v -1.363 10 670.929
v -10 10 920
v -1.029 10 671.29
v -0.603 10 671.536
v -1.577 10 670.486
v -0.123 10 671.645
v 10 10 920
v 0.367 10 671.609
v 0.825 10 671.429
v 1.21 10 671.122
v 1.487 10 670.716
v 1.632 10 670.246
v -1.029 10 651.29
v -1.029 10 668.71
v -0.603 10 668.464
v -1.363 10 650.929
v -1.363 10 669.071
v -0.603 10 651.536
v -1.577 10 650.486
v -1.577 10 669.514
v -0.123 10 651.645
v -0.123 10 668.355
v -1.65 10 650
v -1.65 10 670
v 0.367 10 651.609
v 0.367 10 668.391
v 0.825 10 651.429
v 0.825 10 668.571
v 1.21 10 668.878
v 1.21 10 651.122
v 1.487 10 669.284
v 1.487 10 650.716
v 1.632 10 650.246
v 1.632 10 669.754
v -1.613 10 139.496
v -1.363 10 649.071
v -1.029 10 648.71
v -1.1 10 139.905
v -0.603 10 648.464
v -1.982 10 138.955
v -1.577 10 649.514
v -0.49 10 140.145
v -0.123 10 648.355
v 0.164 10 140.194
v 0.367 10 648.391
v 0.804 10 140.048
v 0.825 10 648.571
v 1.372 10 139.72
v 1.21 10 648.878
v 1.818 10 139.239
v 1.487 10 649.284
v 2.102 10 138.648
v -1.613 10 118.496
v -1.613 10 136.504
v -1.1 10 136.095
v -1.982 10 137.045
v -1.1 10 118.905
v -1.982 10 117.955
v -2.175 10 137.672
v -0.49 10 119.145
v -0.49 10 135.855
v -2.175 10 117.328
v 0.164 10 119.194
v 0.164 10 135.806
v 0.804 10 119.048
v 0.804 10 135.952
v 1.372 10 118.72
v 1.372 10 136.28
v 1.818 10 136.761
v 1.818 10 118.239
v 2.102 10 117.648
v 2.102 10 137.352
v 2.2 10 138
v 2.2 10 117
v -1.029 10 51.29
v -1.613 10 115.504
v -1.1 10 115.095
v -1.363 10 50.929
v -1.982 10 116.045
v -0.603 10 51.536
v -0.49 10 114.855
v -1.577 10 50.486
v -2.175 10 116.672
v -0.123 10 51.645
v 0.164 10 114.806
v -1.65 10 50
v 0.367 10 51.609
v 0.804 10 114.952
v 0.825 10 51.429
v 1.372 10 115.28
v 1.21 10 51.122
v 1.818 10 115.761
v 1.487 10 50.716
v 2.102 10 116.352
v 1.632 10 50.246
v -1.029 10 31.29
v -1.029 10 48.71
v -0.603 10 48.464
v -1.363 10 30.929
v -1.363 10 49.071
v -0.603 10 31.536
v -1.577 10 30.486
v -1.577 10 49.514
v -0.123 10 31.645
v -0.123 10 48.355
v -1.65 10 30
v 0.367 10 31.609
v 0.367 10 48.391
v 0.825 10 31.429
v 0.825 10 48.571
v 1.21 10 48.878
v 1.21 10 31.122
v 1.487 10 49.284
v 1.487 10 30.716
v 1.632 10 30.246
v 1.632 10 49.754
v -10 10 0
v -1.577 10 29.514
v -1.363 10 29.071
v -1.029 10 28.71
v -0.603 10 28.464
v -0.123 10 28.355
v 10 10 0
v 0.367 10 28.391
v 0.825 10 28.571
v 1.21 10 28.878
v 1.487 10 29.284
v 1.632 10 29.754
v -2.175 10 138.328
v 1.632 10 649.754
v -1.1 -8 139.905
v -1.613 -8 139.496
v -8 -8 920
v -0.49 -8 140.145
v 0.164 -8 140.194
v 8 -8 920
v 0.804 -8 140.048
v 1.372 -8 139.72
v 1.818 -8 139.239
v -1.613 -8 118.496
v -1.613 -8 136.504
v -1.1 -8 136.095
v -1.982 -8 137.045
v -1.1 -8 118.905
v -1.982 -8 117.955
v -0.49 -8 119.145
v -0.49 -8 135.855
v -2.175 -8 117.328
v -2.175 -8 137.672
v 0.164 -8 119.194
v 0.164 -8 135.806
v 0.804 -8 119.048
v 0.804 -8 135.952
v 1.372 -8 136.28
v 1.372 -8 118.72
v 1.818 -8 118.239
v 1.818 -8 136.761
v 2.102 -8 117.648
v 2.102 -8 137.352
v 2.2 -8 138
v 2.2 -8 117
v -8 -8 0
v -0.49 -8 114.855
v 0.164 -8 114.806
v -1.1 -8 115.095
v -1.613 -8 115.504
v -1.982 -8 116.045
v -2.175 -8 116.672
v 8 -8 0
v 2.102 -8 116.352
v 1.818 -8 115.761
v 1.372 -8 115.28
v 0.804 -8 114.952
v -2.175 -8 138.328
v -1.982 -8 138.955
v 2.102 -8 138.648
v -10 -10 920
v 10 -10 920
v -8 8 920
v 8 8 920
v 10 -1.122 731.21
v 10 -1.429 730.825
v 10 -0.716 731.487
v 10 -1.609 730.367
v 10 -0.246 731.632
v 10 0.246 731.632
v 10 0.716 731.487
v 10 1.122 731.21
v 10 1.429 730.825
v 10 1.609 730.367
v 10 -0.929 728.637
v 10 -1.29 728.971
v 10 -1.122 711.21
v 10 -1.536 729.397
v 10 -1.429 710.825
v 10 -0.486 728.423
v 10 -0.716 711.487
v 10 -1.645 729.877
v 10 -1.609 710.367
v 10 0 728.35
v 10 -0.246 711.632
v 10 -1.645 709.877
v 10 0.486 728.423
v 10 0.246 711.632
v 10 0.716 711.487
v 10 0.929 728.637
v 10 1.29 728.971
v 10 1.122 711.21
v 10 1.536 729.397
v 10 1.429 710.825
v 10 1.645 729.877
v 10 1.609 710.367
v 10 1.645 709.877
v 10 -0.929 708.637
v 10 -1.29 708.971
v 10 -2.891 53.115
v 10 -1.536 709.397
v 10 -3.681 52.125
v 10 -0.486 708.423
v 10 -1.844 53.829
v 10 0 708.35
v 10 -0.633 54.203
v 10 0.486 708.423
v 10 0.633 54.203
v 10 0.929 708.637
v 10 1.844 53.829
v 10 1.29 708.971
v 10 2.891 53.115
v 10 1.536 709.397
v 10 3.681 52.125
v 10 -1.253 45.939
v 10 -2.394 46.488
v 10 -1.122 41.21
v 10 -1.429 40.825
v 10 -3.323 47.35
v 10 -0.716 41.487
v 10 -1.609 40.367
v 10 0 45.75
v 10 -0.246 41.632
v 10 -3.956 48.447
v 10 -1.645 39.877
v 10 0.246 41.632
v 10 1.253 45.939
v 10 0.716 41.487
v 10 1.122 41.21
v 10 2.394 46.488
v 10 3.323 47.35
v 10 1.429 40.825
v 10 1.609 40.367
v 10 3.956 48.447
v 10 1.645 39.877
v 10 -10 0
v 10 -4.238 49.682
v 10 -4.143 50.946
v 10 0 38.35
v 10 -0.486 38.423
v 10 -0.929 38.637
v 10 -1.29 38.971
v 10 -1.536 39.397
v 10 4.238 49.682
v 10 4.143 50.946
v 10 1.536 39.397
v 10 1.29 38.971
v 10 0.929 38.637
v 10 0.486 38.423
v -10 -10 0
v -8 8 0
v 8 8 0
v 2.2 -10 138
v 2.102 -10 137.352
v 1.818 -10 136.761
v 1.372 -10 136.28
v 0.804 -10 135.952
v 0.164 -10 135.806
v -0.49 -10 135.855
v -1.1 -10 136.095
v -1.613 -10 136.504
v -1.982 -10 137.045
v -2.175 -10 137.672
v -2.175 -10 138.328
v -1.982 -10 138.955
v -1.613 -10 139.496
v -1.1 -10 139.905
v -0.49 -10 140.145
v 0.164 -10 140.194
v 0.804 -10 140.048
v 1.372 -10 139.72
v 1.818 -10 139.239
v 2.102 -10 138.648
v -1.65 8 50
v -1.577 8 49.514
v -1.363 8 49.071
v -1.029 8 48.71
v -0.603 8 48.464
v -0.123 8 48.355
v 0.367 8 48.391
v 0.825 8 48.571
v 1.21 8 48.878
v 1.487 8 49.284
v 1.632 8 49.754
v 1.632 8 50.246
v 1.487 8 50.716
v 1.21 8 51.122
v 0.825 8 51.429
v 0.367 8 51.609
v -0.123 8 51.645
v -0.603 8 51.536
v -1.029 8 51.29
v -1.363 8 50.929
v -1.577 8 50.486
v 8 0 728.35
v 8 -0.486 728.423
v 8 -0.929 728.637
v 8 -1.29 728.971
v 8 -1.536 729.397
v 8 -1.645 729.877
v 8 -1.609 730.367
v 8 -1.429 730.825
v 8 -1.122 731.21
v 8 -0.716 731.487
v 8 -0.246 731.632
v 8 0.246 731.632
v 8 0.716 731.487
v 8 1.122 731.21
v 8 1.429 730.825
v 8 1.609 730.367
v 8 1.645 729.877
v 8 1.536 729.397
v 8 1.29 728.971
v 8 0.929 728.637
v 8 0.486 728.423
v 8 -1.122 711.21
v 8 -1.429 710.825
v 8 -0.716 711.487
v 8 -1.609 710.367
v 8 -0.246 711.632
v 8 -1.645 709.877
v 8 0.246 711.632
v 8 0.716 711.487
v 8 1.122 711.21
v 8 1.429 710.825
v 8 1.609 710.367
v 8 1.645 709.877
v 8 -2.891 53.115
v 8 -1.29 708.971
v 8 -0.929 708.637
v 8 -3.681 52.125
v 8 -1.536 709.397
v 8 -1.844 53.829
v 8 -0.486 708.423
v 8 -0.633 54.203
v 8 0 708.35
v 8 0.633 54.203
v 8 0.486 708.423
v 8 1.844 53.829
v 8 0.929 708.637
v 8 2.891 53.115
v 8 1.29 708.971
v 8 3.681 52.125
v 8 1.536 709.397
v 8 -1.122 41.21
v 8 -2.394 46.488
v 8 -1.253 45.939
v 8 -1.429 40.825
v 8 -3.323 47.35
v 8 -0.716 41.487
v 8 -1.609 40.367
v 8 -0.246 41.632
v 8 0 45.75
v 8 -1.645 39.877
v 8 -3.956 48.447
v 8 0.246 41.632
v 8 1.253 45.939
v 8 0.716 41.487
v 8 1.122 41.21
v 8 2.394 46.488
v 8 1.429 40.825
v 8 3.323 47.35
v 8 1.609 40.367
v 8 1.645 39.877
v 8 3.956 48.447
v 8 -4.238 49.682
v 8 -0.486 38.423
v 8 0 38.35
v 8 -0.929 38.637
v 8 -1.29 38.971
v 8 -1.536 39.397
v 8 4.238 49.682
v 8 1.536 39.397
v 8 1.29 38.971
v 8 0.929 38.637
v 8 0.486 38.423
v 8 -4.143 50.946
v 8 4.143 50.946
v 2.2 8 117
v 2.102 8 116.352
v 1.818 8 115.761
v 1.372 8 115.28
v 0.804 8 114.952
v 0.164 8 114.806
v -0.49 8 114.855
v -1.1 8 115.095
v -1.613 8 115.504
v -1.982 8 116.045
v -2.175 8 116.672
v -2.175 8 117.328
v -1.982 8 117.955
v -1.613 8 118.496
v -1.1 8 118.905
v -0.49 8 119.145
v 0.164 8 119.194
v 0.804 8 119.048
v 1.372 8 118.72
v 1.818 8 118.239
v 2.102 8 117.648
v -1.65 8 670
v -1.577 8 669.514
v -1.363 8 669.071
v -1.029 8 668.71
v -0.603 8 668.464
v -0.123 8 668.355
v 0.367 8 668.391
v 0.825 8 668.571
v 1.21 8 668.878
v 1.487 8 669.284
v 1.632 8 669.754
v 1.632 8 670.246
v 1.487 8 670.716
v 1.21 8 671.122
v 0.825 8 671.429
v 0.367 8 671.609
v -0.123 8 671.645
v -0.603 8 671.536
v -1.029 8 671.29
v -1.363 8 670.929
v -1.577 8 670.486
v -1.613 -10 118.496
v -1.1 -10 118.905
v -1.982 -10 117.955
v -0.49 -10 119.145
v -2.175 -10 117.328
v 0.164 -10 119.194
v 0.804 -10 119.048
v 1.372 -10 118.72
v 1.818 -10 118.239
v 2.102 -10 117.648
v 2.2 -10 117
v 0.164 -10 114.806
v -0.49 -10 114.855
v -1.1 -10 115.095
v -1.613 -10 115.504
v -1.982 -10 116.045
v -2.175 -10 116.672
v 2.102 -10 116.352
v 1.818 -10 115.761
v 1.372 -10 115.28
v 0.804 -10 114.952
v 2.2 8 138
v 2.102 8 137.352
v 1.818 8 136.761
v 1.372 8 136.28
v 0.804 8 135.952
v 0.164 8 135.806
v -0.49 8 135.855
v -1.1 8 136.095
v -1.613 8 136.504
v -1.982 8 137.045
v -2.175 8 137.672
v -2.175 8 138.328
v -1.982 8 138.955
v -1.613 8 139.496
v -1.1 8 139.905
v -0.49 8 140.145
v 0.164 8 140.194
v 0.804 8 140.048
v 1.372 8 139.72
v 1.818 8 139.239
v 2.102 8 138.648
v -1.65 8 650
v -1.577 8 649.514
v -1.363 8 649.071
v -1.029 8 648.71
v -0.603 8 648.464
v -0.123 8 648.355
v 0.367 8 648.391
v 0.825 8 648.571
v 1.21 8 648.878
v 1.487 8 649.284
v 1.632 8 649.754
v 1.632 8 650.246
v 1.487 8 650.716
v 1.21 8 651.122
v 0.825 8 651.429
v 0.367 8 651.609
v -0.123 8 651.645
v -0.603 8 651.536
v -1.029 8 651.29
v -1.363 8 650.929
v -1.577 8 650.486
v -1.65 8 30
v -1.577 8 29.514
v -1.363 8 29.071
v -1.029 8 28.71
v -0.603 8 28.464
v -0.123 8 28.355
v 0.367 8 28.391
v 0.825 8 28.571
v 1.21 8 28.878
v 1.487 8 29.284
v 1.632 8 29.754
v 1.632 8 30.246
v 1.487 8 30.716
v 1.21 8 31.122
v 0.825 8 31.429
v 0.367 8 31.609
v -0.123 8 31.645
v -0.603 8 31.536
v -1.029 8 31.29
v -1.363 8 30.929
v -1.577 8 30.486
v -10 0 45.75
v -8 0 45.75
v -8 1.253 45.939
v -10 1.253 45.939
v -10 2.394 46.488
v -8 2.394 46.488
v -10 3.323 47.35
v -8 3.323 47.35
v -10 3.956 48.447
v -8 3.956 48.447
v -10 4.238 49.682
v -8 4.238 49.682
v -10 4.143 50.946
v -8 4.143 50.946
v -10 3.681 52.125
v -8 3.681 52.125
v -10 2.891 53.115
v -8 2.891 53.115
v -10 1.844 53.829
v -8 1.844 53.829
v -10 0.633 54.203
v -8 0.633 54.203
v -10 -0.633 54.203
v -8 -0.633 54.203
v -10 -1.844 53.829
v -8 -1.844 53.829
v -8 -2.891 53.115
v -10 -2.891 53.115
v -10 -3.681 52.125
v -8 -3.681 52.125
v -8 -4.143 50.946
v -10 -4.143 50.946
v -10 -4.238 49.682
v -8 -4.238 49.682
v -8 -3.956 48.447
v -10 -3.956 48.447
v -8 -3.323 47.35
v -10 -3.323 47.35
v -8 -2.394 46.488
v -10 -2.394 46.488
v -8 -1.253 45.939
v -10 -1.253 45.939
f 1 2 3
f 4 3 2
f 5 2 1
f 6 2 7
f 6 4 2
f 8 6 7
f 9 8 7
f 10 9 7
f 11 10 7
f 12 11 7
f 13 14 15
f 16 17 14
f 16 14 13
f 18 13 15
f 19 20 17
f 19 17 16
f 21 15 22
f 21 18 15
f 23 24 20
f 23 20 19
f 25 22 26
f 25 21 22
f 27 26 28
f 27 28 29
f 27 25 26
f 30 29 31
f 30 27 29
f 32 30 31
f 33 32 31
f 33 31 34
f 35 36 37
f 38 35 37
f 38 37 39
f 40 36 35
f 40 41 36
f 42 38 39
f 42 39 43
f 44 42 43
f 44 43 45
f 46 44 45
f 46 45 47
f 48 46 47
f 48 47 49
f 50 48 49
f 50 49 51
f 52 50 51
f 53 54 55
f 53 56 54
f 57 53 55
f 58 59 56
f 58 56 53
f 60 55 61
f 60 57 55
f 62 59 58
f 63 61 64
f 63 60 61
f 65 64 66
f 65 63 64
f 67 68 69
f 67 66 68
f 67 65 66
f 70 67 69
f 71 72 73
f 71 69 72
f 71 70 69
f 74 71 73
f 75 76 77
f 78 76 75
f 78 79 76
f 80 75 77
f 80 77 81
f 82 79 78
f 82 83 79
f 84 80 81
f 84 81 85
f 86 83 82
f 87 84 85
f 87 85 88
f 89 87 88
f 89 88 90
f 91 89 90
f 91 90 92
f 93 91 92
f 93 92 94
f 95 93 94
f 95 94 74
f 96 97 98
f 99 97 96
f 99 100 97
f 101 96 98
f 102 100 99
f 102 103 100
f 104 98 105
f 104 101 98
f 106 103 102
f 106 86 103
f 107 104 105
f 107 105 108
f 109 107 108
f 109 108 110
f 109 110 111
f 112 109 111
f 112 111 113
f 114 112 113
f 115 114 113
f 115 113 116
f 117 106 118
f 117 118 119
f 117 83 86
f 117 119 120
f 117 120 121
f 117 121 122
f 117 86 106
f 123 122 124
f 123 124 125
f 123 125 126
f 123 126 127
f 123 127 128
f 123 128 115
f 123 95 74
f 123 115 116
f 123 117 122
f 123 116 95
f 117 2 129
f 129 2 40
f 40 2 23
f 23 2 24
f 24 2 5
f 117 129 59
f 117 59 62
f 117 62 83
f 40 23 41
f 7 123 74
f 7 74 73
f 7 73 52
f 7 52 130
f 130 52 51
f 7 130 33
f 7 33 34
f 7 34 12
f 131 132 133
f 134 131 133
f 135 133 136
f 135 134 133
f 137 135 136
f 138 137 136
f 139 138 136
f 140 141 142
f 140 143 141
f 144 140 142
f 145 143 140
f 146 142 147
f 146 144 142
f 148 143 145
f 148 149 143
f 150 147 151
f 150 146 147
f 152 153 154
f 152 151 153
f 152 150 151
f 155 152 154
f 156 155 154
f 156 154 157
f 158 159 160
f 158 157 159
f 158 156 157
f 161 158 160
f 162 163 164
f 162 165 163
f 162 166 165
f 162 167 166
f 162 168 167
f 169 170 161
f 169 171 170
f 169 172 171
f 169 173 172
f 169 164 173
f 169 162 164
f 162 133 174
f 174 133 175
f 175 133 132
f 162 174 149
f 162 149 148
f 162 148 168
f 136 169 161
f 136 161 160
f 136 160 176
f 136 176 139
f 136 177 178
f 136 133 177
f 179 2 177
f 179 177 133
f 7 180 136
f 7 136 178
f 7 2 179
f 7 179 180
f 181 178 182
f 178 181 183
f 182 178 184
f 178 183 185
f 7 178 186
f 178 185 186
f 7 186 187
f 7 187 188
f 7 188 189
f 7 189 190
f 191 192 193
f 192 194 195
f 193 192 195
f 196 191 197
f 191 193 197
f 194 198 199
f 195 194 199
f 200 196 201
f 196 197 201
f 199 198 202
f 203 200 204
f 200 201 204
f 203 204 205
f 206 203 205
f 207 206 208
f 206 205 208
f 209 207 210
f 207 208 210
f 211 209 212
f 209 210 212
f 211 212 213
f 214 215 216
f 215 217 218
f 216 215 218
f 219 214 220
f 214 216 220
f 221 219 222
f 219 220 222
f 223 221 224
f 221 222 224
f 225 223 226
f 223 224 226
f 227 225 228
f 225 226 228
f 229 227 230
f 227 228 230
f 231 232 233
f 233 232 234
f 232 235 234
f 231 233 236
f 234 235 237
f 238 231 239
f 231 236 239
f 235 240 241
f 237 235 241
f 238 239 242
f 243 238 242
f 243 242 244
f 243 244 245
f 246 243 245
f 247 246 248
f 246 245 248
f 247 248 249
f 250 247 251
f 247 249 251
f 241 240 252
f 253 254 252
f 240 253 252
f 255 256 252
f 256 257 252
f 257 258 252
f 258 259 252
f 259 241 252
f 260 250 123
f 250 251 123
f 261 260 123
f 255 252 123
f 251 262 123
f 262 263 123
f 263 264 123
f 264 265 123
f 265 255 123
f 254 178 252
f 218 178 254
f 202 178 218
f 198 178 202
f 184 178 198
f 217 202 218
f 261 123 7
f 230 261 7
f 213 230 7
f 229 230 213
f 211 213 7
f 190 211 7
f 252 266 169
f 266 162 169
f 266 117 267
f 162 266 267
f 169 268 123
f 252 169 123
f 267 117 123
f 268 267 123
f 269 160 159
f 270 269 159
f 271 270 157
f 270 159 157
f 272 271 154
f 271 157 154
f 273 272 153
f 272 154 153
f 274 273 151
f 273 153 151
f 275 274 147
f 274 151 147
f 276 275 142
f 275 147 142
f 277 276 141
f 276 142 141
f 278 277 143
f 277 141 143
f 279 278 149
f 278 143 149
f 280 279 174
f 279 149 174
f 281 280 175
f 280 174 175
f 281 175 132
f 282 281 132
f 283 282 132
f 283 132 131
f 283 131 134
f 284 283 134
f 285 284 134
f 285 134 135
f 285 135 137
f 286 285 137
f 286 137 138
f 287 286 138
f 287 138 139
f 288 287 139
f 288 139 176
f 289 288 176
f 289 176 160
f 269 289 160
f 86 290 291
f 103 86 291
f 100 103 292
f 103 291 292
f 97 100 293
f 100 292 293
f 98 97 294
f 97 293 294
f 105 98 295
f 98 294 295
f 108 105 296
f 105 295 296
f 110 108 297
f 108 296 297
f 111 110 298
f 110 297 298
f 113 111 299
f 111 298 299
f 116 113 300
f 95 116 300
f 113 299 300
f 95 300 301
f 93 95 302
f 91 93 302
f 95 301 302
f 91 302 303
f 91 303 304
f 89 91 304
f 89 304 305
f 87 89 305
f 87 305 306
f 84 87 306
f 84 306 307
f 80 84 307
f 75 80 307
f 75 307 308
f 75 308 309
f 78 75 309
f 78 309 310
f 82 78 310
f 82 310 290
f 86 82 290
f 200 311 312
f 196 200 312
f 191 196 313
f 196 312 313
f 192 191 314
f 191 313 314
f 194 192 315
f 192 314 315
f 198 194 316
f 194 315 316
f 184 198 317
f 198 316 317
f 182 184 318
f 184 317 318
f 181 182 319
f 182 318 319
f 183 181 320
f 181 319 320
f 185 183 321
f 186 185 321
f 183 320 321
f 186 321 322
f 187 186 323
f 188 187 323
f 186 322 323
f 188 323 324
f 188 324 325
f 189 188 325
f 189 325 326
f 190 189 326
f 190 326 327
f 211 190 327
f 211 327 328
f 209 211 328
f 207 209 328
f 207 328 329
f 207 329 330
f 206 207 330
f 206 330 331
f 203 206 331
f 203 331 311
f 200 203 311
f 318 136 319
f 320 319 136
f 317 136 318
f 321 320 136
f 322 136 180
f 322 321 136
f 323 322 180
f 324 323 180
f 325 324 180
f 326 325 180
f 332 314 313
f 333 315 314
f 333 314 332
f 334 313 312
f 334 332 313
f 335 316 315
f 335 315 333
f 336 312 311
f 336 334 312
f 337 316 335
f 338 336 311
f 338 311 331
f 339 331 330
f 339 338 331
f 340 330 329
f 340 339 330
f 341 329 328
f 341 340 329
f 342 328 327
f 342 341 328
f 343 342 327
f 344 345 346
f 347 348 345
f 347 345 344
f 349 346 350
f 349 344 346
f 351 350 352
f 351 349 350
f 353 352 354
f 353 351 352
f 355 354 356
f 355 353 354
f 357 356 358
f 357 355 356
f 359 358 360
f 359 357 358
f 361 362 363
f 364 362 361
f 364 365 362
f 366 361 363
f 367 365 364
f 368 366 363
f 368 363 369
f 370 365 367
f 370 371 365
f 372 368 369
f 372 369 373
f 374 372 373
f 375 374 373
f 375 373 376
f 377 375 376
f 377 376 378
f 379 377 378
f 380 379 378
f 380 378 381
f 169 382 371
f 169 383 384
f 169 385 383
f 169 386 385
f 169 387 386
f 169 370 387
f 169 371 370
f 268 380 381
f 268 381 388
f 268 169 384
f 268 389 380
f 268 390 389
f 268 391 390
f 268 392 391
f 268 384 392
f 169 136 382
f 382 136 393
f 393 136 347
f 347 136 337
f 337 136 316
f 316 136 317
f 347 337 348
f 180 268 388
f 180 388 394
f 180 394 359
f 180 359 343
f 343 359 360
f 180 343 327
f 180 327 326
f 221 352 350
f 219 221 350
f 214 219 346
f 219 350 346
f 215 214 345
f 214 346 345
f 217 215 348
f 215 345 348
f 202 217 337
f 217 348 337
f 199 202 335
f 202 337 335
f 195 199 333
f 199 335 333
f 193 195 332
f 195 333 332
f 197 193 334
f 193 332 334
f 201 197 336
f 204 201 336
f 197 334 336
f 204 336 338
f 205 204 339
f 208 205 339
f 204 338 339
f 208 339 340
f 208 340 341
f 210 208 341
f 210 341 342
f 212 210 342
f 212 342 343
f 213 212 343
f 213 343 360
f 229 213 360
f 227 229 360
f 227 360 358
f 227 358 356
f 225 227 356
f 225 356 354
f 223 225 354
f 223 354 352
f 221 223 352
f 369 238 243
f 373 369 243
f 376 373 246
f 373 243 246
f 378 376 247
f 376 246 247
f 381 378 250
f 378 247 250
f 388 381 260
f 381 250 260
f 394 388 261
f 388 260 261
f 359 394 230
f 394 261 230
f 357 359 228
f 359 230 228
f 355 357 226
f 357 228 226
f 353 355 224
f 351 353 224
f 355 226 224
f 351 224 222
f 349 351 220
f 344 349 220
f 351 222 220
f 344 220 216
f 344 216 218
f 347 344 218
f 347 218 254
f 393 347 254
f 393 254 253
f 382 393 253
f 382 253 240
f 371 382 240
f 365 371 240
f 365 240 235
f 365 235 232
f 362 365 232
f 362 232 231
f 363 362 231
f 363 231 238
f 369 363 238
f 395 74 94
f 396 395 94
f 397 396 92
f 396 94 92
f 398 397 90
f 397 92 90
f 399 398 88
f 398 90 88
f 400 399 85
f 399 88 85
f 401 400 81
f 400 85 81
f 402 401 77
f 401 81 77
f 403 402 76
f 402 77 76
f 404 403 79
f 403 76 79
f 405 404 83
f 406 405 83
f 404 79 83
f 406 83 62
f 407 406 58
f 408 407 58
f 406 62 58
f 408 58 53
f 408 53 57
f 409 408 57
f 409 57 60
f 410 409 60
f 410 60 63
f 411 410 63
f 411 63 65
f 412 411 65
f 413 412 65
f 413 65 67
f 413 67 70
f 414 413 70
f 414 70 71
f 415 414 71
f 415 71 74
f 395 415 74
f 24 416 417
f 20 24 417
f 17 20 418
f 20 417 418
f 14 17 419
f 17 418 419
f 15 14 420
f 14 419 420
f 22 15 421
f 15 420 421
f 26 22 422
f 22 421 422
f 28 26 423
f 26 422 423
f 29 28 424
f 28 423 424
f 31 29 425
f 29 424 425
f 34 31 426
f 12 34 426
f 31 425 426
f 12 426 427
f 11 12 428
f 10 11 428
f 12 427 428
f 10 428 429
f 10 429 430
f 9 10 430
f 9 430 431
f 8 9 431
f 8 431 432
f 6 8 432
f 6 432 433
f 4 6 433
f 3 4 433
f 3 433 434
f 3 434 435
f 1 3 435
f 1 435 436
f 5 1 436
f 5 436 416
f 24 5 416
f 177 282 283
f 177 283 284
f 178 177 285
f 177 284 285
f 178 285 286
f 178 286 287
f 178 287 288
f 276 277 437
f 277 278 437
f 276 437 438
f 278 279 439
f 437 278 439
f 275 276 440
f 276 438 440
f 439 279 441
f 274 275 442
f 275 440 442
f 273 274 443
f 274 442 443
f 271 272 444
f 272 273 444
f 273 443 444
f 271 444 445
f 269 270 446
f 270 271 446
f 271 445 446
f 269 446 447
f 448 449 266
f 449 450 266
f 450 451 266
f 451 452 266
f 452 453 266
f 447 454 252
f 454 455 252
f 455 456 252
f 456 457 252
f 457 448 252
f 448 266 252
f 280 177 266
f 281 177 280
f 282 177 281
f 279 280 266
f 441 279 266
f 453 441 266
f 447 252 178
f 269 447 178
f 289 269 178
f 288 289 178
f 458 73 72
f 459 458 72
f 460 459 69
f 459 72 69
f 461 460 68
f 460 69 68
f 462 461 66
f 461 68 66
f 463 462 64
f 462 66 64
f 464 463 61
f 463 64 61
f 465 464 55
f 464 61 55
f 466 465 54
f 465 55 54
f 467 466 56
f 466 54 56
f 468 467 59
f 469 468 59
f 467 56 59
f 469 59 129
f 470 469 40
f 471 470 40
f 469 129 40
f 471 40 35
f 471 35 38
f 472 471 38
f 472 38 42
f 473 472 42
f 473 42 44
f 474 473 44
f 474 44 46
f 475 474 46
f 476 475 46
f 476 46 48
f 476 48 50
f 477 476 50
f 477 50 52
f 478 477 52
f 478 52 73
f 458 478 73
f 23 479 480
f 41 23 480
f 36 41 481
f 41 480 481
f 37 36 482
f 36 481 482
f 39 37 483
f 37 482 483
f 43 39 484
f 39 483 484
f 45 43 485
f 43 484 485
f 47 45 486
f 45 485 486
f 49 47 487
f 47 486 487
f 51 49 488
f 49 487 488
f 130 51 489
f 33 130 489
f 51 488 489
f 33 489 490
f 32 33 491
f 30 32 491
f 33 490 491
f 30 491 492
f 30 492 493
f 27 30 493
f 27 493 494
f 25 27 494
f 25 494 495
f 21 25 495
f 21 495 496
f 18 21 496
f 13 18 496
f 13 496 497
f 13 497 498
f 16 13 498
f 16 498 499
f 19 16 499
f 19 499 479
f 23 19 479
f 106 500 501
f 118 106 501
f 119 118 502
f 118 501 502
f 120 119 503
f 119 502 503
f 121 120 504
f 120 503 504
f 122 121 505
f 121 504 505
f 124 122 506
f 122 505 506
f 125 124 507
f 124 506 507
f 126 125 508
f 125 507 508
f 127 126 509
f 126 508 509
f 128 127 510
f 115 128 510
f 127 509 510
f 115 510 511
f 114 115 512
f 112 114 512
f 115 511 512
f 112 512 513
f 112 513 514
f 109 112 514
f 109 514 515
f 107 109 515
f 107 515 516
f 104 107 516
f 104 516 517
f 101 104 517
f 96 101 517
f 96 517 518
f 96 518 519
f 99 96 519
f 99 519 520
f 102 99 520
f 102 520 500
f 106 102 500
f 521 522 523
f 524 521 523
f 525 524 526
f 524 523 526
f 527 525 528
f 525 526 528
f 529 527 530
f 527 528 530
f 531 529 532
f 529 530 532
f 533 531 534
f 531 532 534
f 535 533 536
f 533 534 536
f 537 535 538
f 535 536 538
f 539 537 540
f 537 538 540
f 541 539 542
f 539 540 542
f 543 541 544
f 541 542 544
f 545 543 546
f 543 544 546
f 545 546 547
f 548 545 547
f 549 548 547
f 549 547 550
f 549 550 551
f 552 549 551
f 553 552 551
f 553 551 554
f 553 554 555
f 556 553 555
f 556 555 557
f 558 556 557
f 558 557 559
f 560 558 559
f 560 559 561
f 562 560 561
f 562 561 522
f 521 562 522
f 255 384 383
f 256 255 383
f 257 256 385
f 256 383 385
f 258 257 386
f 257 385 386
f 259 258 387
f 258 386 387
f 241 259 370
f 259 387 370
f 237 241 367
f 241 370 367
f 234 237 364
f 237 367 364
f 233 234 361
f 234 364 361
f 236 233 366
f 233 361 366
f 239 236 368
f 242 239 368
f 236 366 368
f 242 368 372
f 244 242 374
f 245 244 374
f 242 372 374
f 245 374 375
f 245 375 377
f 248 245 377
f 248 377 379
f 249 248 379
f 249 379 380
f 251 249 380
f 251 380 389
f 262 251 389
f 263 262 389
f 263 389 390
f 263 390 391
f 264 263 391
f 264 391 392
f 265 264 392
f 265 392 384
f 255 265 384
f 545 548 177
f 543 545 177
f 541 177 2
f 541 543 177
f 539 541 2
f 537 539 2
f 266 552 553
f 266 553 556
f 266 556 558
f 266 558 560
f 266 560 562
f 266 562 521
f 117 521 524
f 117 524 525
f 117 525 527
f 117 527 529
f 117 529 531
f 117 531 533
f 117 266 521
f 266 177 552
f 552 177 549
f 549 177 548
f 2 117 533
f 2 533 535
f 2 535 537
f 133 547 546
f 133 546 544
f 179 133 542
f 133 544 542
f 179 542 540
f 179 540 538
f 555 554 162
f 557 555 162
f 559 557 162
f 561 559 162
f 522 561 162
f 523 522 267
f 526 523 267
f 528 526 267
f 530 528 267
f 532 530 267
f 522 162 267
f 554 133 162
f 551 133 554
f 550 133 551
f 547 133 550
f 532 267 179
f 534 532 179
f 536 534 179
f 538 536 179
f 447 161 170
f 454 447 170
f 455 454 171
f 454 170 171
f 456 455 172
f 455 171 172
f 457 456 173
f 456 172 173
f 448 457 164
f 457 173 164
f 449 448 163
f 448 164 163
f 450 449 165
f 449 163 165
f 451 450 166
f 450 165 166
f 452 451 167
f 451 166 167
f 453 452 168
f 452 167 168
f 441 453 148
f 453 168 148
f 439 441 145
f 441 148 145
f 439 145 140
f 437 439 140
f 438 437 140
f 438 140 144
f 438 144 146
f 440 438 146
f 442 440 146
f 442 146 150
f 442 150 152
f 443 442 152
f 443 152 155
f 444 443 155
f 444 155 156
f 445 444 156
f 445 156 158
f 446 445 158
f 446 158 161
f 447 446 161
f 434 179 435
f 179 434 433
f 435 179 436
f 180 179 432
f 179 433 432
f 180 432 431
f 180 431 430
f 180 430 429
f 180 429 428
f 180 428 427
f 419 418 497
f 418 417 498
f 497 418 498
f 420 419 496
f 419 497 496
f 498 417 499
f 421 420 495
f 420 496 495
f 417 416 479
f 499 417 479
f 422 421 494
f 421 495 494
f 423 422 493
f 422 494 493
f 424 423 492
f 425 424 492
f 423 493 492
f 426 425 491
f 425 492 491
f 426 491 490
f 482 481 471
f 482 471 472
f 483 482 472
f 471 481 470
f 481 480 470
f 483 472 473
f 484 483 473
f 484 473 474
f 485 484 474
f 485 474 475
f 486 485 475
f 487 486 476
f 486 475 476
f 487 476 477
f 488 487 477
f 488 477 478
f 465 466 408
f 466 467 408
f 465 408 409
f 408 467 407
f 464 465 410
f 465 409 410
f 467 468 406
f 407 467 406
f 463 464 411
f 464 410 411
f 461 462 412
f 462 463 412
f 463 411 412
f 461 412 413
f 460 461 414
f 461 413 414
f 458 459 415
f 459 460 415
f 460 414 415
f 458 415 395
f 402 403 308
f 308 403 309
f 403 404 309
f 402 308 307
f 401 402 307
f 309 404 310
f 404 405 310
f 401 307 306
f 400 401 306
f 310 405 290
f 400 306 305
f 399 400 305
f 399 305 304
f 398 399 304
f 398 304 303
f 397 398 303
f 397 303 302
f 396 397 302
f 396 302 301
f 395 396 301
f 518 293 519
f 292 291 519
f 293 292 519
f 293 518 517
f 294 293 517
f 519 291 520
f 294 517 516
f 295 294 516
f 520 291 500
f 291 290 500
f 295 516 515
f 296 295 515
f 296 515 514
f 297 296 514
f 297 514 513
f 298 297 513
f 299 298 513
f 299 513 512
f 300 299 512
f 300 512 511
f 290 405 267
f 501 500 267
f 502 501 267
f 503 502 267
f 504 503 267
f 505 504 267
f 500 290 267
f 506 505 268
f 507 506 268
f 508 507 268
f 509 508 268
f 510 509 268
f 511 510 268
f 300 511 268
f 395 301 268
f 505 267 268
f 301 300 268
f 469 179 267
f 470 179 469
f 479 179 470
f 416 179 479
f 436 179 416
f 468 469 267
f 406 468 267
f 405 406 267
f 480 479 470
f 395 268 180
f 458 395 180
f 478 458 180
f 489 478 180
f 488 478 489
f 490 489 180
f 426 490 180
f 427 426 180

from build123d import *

# Parameters (mm, degrees)
SKETCH_1_W           = 20
SKETCH_1_H           = 20
SKETCH_1_W_2         = 16
SKETCH_1_H_2         = 16
EXTRUDE_1_DEPTH      = 970
SKETCH_2_R           = 1
SKETCH_2_R_2         = 4.25
CUT_EXTRUDE_1_DEPTH  = 10
CUT_EXTRUDE_2_DEPTH  = 10
SKETCH_5_R           = 2.2
CUT_EXTRUDE_7_DEPTH  = 30
SKETCH_6_W           = 27.825743136
SKETCH_6_H           = 21.841712354
CUT_EXTRUDE_8_DEPTH  = 50
M4X0_7_3_D           = 3.3
M4X0_7_3_DEPTH       = 11.5
M4X0_7_3_TIP         = 0.991420021
SKETCH_11_R          = 1
CUT_EXTRUDE_9_DEPTH  = 10
M4X0_7_4_D           = 3.3
M4X0_7_4_DEPTH       = 11.5
M4X0_7_4_TIP         = 0.991420021
SKETCH_13_R          = 4.25
CUT_EXTRUDE_10_DEPTH = 21
M4X0_7_5_D           = 3.3
M4X0_7_5_DEPTH       = 11.5
M4X0_7_5_TIP         = 0.991420021


with BuildPart() as part:
    # ｽｹｯﾁ1 → ﾎﾞｽ - 押し出し1 (new body)
    with BuildSketch(Plane.XY):
        Rectangle(SKETCH_1_W, SKETCH_1_H)
        Rectangle(SKETCH_1_W_2, SKETCH_1_H_2, mode=Mode.SUBTRACT)
    extrude(amount=EXTRUDE_1_DEPTH)

    # ｽｹｯﾁ2 → ｶｯﾄ - 押し出し1 (cut)
    with BuildSketch(Plane(origin=(10, 0, 0), x_dir=(0, 0, -1), z_dir=(1, 0, 0))):
        with Locations((-710, 0)):
            Circle(SKETCH_2_R)
        with Locations((-50, 0)):
            Circle(SKETCH_2_R_2)
        with Locations((-40, 0)):
            Circle(SKETCH_2_R)
        with Locations((-730, 0)):
            Circle(SKETCH_2_R)
    extrude(amount=-CUT_EXTRUDE_1_DEPTH, mode=Mode.SUBTRACT)

    # ｽｹｯﾁ3 → ｶｯﾄ - 押し出し2 (cut)
    with BuildSketch(Plane(origin=(0, 10, 0), x_dir=(1, 0, 0), z_dir=(0, 1, 0))):
        with BuildLine():
            ThreePointArc((0, -649), (-1, -650), (0, -651))
            Line((0, -651), (0, -650))
            Line((0, -650), (0, -649))
        make_face()
        with BuildLine():
            Line((0, -650), (0, -651))
            ThreePointArc((0, -651), (0.707106781, -650.707106781), (1, -650))
            ThreePointArc((1, -650), (0.707106781, -649.292893219), (0, -649))
            Line((0, -649), (0, -650))
        make_face()
        with BuildLine():
            ThreePointArc((0, -669), (-1, -670), (0, -671))
            Line((0, -671), (0, -670))
            Line((0, -670), (0, -669))
        make_face()
        with BuildLine():
            Line((0, -670), (0, -671))
            ThreePointArc((0, -671), (0.707106781, -670.707106781), (1, -670))
            ThreePointArc((1, -670), (0.707106781, -669.292893219), (0, -669))
            Line((0, -669), (0, -670))
        make_face()
    extrude(amount=-CUT_EXTRUDE_2_DEPTH, mode=Mode.SUBTRACT)

    # ｽｹｯﾁ5 → ｶｯﾄ - 押し出し7 (cut)
    with BuildSketch(Plane(origin=(0, 10, 0), x_dir=(1, 0, 0), z_dir=(0, 1, 0))):
        with Locations((0, -117)):
            Circle(SKETCH_5_R)
        with Locations((0, -138)):
            Circle(SKETCH_5_R)
    extrude(amount=-CUT_EXTRUDE_7_DEPTH, mode=Mode.SUBTRACT)

    # ｽｹｯﾁ6 → ｶｯﾄ - 押し出し8 (cut)
    with BuildSketch(Plane.XY.offset(970)):
        Rectangle(SKETCH_6_W, SKETCH_6_H)
    extrude(amount=-CUT_EXTRUDE_8_DEPTH, mode=Mode.SUBTRACT)

    # M4x0.7 ねじ穴3
    with Locations(Plane(origin=(0, 10, 650), x_dir=(1, 0, 0), z_dir=(0, 1, 0))):
        with Locations((0, 0), (0, -20)):
            Hole(M4X0_7_3_D / 2, depth=M4X0_7_3_DEPTH)
            with Locations((0, 0, -(M4X0_7_3_DEPTH + M4X0_7_3_TIP / 2))):  # 118° drill point
                Cone(0, M4X0_7_3_D / 2, M4X0_7_3_TIP, mode=Mode.SUBTRACT)

    # ｽｹｯﾁ11 → ｶｯﾄ - 押し出し9 (cut)
    with BuildSketch(Plane(origin=(0, 10, 0), x_dir=(1, 0, 0), z_dir=(0, 1, 0))):
        with Locations((0, -30)):
            Circle(SKETCH_11_R)
        with Locations((0, -50)):
            Circle(SKETCH_11_R)
    extrude(amount=-CUT_EXTRUDE_9_DEPTH, mode=Mode.SUBTRACT)

    # M4x0.7 ねじ穴4
    with Locations(Plane(origin=(0, 10, 30), x_dir=(1, 0, 0), z_dir=(0, 1, 0))):
        with Locations((0, 0), (0, -20)):
            Hole(M4X0_7_4_D / 2, depth=M4X0_7_4_DEPTH)
            with Locations((0, 0, -(M4X0_7_4_DEPTH + M4X0_7_4_TIP / 2))):  # 118° drill point
                Cone(0, M4X0_7_4_D / 2, M4X0_7_4_TIP, mode=Mode.SUBTRACT)

    # ｽｹｯﾁ13 → ｶｯﾄ - 押し出し10 (cut, through all)
    with BuildSketch(Plane(origin=(10, 0, 0), x_dir=(0, 0, -1), z_dir=(1, 0, 0))):
        with Locations((-50, 0)):
            Circle(SKETCH_13_R)
    extrude(amount=-CUT_EXTRUDE_10_DEPTH, mode=Mode.SUBTRACT)

    # M4x0.7 ねじ穴5
    with Locations(Plane(origin=(10, 0, 40), x_dir=(0, 0, 1), z_dir=(1, 0, 0))):
        with Locations((0, 0), (670, 0), (690, 0)):
            Hole(M4X0_7_5_D / 2, depth=M4X0_7_5_DEPTH)
            with Locations((0, 0, -(M4X0_7_5_DEPTH + M4X0_7_5_TIP / 2))):  # 118° drill point
                Cone(0, M4X0_7_5_D / 2, M4X0_7_5_TIP, mode=Mode.SUBTRACT)


solid = part.part
